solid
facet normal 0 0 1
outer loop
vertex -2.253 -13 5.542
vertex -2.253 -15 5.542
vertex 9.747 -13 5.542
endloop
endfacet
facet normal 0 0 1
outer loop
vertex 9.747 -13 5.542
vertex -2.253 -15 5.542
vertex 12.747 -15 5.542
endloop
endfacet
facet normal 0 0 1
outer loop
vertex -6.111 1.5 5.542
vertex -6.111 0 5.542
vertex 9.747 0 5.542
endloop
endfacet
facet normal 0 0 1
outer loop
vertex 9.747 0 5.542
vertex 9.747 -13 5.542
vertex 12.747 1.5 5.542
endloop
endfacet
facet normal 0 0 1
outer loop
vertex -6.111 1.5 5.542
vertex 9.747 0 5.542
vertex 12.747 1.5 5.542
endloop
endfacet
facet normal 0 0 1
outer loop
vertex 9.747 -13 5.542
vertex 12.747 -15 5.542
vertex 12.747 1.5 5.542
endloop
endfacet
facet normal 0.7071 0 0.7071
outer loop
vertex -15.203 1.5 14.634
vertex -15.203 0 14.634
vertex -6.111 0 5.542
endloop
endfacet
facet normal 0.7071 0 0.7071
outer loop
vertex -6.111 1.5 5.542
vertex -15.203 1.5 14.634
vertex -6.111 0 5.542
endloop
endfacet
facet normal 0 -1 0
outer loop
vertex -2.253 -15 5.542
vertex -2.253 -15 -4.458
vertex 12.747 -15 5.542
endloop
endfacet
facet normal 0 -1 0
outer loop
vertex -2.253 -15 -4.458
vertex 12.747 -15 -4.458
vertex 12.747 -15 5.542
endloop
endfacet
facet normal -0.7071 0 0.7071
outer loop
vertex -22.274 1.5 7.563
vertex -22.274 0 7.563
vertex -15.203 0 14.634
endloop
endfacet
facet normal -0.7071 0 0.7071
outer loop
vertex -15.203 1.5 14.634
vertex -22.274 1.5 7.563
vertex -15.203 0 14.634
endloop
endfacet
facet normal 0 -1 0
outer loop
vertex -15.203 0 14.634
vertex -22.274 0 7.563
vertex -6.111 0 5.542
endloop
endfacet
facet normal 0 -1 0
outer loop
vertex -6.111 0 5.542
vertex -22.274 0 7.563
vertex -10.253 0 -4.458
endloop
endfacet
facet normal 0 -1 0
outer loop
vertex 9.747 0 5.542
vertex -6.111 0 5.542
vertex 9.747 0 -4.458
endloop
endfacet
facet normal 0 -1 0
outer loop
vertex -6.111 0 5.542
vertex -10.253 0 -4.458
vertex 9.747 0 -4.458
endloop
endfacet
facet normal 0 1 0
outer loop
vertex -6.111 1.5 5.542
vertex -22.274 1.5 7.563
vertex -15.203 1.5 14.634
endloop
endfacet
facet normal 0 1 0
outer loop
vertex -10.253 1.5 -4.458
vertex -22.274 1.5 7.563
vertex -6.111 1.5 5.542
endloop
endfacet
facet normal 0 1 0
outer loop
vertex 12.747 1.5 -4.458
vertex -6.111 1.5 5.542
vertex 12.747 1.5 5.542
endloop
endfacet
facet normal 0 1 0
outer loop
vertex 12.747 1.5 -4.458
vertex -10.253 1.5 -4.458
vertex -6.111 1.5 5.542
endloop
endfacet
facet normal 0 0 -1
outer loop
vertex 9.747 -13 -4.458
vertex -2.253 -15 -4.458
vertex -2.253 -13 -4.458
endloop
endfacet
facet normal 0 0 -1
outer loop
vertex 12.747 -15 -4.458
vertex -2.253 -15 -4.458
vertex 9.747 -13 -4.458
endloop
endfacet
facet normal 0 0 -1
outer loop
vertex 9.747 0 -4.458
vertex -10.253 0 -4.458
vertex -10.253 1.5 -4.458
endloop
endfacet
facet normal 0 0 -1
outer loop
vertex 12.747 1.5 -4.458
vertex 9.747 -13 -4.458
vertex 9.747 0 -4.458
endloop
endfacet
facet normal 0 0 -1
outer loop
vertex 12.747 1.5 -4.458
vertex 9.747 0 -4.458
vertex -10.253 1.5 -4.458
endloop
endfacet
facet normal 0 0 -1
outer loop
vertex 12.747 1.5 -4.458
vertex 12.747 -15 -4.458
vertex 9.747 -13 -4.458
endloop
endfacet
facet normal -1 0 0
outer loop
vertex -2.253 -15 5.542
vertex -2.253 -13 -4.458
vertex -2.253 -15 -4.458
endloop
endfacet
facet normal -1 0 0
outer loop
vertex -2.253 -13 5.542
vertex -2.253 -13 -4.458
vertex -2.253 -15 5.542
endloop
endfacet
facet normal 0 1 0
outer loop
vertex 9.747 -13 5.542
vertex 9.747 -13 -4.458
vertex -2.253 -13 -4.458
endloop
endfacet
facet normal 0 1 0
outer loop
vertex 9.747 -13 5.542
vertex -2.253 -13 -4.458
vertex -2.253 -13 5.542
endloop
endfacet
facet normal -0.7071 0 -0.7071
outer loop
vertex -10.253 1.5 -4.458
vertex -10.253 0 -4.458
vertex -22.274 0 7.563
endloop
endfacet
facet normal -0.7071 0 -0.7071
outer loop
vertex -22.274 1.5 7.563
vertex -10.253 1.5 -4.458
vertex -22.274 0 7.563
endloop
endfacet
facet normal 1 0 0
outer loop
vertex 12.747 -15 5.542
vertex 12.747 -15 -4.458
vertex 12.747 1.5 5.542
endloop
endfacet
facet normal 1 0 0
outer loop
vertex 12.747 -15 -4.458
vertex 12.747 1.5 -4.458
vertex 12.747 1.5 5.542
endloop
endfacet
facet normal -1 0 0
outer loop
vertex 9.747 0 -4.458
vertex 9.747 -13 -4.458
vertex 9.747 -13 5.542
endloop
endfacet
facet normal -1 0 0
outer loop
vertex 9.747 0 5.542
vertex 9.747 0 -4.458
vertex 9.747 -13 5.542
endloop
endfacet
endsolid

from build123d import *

# Parameters (mm, degrees)
BOSS_EXTRUDE1_DEPTH = 1.5
SKETCH2_W           = 3
SKETCH2_H           = 10
BOSS_EXTRUDE2_DEPTH = 15
SKETCH3_W           = 10
SKETCH3_H           = 2
BOSS_EXTRUDE3_DEPTH = 12


with BuildPart() as part:
    # Sketch1 → Boss-Extrude1 (new body)
    with BuildSketch(Plane(origin=(0, 0, 0), x_dir=(1, 0, 0), z_dir=(0, 1, 0))):
        Polygon((-10.25315493, 4.457893448), (-22.27397021, -7.562921833), (-15.202902398, -14.633989644), (-6.111019306, -5.542106552), (12.74684507, -5.542106552), (12.74684507, 4.457893448), align=None)
    extrude(amount=BOSS_EXTRUDE1_DEPTH)

    # Sketch2 → Boss-Extrude2 (add)
    with BuildSketch(Plane.XZ):
        with Locations((11.24684507, 0.542106552)):
            Rectangle(SKETCH2_W, SKETCH2_H)
    extrude(amount=BOSS_EXTRUDE2_DEPTH)

    # Sketch3 → Boss-Extrude3 (add)
    with BuildSketch(Plane.ZY.offset(-9.74684507)):
        with Locations((0.542106552, -14)):
            Rectangle(SKETCH3_W, SKETCH3_H)
    extrude(amount=BOSS_EXTRUDE3_DEPTH)


solid = part.part
